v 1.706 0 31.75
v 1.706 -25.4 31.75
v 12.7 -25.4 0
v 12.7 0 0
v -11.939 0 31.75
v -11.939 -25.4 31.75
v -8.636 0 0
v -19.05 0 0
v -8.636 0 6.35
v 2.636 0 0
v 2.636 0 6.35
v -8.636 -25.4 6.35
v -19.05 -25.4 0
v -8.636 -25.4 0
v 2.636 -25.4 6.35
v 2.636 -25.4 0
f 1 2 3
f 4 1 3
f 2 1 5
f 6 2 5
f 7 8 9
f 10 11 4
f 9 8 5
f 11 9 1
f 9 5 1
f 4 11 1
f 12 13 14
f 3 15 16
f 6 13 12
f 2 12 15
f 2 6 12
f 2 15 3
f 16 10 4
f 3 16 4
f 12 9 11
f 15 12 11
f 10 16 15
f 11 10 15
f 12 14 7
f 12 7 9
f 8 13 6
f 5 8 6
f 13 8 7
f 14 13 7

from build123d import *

# Parameters (mm, degrees)
F1_DEPTH = 25.4
F3_DEPTH = 25.4
F5_DEPTH = 25.4
F6_W     = 11.27199
F6_H     = 6.35
F7_DEPTH = 25.4


with BuildPart() as f1:
    # F0 (on Front) → F1 (new body)
    with BuildSketch(Plane.XZ):
        Polygon((-19.05, 0), (0, 0), (12.7, 0), (12.7, 31.75), (-19.05, 31.75), align=None)
    extrude(amount=F1_DEPTH)

    # F2 (on face) → F3 (cut)
    with BuildSketch(Plane.XZ.offset(25.4)):
        Polygon((12.7, 0), (12.7, 31.75), (1.705643, 31.75), align=None)
    extrude(amount=-F3_DEPTH, mode=Mode.SUBTRACT)

    # F4 (on face) → F5 (cut)
    with BuildSketch(Plane.XZ.offset(25.4)):
        Polygon((-11.939476, 31.75), (-19.05, 31.75), (-19.05, 0), align=None)
    extrude(amount=-F5_DEPTH, mode=Mode.SUBTRACT)

    # F6 (on face) → F7 (cut)
    with BuildSketch(Plane.XZ.offset(25.4)):
        with Locations((-3.000005, 3.175)):
            Rectangle(F6_W, F6_H)
    extrude(amount=-F7_DEPTH, mode=Mode.SUBTRACT)


solid = f1.part
